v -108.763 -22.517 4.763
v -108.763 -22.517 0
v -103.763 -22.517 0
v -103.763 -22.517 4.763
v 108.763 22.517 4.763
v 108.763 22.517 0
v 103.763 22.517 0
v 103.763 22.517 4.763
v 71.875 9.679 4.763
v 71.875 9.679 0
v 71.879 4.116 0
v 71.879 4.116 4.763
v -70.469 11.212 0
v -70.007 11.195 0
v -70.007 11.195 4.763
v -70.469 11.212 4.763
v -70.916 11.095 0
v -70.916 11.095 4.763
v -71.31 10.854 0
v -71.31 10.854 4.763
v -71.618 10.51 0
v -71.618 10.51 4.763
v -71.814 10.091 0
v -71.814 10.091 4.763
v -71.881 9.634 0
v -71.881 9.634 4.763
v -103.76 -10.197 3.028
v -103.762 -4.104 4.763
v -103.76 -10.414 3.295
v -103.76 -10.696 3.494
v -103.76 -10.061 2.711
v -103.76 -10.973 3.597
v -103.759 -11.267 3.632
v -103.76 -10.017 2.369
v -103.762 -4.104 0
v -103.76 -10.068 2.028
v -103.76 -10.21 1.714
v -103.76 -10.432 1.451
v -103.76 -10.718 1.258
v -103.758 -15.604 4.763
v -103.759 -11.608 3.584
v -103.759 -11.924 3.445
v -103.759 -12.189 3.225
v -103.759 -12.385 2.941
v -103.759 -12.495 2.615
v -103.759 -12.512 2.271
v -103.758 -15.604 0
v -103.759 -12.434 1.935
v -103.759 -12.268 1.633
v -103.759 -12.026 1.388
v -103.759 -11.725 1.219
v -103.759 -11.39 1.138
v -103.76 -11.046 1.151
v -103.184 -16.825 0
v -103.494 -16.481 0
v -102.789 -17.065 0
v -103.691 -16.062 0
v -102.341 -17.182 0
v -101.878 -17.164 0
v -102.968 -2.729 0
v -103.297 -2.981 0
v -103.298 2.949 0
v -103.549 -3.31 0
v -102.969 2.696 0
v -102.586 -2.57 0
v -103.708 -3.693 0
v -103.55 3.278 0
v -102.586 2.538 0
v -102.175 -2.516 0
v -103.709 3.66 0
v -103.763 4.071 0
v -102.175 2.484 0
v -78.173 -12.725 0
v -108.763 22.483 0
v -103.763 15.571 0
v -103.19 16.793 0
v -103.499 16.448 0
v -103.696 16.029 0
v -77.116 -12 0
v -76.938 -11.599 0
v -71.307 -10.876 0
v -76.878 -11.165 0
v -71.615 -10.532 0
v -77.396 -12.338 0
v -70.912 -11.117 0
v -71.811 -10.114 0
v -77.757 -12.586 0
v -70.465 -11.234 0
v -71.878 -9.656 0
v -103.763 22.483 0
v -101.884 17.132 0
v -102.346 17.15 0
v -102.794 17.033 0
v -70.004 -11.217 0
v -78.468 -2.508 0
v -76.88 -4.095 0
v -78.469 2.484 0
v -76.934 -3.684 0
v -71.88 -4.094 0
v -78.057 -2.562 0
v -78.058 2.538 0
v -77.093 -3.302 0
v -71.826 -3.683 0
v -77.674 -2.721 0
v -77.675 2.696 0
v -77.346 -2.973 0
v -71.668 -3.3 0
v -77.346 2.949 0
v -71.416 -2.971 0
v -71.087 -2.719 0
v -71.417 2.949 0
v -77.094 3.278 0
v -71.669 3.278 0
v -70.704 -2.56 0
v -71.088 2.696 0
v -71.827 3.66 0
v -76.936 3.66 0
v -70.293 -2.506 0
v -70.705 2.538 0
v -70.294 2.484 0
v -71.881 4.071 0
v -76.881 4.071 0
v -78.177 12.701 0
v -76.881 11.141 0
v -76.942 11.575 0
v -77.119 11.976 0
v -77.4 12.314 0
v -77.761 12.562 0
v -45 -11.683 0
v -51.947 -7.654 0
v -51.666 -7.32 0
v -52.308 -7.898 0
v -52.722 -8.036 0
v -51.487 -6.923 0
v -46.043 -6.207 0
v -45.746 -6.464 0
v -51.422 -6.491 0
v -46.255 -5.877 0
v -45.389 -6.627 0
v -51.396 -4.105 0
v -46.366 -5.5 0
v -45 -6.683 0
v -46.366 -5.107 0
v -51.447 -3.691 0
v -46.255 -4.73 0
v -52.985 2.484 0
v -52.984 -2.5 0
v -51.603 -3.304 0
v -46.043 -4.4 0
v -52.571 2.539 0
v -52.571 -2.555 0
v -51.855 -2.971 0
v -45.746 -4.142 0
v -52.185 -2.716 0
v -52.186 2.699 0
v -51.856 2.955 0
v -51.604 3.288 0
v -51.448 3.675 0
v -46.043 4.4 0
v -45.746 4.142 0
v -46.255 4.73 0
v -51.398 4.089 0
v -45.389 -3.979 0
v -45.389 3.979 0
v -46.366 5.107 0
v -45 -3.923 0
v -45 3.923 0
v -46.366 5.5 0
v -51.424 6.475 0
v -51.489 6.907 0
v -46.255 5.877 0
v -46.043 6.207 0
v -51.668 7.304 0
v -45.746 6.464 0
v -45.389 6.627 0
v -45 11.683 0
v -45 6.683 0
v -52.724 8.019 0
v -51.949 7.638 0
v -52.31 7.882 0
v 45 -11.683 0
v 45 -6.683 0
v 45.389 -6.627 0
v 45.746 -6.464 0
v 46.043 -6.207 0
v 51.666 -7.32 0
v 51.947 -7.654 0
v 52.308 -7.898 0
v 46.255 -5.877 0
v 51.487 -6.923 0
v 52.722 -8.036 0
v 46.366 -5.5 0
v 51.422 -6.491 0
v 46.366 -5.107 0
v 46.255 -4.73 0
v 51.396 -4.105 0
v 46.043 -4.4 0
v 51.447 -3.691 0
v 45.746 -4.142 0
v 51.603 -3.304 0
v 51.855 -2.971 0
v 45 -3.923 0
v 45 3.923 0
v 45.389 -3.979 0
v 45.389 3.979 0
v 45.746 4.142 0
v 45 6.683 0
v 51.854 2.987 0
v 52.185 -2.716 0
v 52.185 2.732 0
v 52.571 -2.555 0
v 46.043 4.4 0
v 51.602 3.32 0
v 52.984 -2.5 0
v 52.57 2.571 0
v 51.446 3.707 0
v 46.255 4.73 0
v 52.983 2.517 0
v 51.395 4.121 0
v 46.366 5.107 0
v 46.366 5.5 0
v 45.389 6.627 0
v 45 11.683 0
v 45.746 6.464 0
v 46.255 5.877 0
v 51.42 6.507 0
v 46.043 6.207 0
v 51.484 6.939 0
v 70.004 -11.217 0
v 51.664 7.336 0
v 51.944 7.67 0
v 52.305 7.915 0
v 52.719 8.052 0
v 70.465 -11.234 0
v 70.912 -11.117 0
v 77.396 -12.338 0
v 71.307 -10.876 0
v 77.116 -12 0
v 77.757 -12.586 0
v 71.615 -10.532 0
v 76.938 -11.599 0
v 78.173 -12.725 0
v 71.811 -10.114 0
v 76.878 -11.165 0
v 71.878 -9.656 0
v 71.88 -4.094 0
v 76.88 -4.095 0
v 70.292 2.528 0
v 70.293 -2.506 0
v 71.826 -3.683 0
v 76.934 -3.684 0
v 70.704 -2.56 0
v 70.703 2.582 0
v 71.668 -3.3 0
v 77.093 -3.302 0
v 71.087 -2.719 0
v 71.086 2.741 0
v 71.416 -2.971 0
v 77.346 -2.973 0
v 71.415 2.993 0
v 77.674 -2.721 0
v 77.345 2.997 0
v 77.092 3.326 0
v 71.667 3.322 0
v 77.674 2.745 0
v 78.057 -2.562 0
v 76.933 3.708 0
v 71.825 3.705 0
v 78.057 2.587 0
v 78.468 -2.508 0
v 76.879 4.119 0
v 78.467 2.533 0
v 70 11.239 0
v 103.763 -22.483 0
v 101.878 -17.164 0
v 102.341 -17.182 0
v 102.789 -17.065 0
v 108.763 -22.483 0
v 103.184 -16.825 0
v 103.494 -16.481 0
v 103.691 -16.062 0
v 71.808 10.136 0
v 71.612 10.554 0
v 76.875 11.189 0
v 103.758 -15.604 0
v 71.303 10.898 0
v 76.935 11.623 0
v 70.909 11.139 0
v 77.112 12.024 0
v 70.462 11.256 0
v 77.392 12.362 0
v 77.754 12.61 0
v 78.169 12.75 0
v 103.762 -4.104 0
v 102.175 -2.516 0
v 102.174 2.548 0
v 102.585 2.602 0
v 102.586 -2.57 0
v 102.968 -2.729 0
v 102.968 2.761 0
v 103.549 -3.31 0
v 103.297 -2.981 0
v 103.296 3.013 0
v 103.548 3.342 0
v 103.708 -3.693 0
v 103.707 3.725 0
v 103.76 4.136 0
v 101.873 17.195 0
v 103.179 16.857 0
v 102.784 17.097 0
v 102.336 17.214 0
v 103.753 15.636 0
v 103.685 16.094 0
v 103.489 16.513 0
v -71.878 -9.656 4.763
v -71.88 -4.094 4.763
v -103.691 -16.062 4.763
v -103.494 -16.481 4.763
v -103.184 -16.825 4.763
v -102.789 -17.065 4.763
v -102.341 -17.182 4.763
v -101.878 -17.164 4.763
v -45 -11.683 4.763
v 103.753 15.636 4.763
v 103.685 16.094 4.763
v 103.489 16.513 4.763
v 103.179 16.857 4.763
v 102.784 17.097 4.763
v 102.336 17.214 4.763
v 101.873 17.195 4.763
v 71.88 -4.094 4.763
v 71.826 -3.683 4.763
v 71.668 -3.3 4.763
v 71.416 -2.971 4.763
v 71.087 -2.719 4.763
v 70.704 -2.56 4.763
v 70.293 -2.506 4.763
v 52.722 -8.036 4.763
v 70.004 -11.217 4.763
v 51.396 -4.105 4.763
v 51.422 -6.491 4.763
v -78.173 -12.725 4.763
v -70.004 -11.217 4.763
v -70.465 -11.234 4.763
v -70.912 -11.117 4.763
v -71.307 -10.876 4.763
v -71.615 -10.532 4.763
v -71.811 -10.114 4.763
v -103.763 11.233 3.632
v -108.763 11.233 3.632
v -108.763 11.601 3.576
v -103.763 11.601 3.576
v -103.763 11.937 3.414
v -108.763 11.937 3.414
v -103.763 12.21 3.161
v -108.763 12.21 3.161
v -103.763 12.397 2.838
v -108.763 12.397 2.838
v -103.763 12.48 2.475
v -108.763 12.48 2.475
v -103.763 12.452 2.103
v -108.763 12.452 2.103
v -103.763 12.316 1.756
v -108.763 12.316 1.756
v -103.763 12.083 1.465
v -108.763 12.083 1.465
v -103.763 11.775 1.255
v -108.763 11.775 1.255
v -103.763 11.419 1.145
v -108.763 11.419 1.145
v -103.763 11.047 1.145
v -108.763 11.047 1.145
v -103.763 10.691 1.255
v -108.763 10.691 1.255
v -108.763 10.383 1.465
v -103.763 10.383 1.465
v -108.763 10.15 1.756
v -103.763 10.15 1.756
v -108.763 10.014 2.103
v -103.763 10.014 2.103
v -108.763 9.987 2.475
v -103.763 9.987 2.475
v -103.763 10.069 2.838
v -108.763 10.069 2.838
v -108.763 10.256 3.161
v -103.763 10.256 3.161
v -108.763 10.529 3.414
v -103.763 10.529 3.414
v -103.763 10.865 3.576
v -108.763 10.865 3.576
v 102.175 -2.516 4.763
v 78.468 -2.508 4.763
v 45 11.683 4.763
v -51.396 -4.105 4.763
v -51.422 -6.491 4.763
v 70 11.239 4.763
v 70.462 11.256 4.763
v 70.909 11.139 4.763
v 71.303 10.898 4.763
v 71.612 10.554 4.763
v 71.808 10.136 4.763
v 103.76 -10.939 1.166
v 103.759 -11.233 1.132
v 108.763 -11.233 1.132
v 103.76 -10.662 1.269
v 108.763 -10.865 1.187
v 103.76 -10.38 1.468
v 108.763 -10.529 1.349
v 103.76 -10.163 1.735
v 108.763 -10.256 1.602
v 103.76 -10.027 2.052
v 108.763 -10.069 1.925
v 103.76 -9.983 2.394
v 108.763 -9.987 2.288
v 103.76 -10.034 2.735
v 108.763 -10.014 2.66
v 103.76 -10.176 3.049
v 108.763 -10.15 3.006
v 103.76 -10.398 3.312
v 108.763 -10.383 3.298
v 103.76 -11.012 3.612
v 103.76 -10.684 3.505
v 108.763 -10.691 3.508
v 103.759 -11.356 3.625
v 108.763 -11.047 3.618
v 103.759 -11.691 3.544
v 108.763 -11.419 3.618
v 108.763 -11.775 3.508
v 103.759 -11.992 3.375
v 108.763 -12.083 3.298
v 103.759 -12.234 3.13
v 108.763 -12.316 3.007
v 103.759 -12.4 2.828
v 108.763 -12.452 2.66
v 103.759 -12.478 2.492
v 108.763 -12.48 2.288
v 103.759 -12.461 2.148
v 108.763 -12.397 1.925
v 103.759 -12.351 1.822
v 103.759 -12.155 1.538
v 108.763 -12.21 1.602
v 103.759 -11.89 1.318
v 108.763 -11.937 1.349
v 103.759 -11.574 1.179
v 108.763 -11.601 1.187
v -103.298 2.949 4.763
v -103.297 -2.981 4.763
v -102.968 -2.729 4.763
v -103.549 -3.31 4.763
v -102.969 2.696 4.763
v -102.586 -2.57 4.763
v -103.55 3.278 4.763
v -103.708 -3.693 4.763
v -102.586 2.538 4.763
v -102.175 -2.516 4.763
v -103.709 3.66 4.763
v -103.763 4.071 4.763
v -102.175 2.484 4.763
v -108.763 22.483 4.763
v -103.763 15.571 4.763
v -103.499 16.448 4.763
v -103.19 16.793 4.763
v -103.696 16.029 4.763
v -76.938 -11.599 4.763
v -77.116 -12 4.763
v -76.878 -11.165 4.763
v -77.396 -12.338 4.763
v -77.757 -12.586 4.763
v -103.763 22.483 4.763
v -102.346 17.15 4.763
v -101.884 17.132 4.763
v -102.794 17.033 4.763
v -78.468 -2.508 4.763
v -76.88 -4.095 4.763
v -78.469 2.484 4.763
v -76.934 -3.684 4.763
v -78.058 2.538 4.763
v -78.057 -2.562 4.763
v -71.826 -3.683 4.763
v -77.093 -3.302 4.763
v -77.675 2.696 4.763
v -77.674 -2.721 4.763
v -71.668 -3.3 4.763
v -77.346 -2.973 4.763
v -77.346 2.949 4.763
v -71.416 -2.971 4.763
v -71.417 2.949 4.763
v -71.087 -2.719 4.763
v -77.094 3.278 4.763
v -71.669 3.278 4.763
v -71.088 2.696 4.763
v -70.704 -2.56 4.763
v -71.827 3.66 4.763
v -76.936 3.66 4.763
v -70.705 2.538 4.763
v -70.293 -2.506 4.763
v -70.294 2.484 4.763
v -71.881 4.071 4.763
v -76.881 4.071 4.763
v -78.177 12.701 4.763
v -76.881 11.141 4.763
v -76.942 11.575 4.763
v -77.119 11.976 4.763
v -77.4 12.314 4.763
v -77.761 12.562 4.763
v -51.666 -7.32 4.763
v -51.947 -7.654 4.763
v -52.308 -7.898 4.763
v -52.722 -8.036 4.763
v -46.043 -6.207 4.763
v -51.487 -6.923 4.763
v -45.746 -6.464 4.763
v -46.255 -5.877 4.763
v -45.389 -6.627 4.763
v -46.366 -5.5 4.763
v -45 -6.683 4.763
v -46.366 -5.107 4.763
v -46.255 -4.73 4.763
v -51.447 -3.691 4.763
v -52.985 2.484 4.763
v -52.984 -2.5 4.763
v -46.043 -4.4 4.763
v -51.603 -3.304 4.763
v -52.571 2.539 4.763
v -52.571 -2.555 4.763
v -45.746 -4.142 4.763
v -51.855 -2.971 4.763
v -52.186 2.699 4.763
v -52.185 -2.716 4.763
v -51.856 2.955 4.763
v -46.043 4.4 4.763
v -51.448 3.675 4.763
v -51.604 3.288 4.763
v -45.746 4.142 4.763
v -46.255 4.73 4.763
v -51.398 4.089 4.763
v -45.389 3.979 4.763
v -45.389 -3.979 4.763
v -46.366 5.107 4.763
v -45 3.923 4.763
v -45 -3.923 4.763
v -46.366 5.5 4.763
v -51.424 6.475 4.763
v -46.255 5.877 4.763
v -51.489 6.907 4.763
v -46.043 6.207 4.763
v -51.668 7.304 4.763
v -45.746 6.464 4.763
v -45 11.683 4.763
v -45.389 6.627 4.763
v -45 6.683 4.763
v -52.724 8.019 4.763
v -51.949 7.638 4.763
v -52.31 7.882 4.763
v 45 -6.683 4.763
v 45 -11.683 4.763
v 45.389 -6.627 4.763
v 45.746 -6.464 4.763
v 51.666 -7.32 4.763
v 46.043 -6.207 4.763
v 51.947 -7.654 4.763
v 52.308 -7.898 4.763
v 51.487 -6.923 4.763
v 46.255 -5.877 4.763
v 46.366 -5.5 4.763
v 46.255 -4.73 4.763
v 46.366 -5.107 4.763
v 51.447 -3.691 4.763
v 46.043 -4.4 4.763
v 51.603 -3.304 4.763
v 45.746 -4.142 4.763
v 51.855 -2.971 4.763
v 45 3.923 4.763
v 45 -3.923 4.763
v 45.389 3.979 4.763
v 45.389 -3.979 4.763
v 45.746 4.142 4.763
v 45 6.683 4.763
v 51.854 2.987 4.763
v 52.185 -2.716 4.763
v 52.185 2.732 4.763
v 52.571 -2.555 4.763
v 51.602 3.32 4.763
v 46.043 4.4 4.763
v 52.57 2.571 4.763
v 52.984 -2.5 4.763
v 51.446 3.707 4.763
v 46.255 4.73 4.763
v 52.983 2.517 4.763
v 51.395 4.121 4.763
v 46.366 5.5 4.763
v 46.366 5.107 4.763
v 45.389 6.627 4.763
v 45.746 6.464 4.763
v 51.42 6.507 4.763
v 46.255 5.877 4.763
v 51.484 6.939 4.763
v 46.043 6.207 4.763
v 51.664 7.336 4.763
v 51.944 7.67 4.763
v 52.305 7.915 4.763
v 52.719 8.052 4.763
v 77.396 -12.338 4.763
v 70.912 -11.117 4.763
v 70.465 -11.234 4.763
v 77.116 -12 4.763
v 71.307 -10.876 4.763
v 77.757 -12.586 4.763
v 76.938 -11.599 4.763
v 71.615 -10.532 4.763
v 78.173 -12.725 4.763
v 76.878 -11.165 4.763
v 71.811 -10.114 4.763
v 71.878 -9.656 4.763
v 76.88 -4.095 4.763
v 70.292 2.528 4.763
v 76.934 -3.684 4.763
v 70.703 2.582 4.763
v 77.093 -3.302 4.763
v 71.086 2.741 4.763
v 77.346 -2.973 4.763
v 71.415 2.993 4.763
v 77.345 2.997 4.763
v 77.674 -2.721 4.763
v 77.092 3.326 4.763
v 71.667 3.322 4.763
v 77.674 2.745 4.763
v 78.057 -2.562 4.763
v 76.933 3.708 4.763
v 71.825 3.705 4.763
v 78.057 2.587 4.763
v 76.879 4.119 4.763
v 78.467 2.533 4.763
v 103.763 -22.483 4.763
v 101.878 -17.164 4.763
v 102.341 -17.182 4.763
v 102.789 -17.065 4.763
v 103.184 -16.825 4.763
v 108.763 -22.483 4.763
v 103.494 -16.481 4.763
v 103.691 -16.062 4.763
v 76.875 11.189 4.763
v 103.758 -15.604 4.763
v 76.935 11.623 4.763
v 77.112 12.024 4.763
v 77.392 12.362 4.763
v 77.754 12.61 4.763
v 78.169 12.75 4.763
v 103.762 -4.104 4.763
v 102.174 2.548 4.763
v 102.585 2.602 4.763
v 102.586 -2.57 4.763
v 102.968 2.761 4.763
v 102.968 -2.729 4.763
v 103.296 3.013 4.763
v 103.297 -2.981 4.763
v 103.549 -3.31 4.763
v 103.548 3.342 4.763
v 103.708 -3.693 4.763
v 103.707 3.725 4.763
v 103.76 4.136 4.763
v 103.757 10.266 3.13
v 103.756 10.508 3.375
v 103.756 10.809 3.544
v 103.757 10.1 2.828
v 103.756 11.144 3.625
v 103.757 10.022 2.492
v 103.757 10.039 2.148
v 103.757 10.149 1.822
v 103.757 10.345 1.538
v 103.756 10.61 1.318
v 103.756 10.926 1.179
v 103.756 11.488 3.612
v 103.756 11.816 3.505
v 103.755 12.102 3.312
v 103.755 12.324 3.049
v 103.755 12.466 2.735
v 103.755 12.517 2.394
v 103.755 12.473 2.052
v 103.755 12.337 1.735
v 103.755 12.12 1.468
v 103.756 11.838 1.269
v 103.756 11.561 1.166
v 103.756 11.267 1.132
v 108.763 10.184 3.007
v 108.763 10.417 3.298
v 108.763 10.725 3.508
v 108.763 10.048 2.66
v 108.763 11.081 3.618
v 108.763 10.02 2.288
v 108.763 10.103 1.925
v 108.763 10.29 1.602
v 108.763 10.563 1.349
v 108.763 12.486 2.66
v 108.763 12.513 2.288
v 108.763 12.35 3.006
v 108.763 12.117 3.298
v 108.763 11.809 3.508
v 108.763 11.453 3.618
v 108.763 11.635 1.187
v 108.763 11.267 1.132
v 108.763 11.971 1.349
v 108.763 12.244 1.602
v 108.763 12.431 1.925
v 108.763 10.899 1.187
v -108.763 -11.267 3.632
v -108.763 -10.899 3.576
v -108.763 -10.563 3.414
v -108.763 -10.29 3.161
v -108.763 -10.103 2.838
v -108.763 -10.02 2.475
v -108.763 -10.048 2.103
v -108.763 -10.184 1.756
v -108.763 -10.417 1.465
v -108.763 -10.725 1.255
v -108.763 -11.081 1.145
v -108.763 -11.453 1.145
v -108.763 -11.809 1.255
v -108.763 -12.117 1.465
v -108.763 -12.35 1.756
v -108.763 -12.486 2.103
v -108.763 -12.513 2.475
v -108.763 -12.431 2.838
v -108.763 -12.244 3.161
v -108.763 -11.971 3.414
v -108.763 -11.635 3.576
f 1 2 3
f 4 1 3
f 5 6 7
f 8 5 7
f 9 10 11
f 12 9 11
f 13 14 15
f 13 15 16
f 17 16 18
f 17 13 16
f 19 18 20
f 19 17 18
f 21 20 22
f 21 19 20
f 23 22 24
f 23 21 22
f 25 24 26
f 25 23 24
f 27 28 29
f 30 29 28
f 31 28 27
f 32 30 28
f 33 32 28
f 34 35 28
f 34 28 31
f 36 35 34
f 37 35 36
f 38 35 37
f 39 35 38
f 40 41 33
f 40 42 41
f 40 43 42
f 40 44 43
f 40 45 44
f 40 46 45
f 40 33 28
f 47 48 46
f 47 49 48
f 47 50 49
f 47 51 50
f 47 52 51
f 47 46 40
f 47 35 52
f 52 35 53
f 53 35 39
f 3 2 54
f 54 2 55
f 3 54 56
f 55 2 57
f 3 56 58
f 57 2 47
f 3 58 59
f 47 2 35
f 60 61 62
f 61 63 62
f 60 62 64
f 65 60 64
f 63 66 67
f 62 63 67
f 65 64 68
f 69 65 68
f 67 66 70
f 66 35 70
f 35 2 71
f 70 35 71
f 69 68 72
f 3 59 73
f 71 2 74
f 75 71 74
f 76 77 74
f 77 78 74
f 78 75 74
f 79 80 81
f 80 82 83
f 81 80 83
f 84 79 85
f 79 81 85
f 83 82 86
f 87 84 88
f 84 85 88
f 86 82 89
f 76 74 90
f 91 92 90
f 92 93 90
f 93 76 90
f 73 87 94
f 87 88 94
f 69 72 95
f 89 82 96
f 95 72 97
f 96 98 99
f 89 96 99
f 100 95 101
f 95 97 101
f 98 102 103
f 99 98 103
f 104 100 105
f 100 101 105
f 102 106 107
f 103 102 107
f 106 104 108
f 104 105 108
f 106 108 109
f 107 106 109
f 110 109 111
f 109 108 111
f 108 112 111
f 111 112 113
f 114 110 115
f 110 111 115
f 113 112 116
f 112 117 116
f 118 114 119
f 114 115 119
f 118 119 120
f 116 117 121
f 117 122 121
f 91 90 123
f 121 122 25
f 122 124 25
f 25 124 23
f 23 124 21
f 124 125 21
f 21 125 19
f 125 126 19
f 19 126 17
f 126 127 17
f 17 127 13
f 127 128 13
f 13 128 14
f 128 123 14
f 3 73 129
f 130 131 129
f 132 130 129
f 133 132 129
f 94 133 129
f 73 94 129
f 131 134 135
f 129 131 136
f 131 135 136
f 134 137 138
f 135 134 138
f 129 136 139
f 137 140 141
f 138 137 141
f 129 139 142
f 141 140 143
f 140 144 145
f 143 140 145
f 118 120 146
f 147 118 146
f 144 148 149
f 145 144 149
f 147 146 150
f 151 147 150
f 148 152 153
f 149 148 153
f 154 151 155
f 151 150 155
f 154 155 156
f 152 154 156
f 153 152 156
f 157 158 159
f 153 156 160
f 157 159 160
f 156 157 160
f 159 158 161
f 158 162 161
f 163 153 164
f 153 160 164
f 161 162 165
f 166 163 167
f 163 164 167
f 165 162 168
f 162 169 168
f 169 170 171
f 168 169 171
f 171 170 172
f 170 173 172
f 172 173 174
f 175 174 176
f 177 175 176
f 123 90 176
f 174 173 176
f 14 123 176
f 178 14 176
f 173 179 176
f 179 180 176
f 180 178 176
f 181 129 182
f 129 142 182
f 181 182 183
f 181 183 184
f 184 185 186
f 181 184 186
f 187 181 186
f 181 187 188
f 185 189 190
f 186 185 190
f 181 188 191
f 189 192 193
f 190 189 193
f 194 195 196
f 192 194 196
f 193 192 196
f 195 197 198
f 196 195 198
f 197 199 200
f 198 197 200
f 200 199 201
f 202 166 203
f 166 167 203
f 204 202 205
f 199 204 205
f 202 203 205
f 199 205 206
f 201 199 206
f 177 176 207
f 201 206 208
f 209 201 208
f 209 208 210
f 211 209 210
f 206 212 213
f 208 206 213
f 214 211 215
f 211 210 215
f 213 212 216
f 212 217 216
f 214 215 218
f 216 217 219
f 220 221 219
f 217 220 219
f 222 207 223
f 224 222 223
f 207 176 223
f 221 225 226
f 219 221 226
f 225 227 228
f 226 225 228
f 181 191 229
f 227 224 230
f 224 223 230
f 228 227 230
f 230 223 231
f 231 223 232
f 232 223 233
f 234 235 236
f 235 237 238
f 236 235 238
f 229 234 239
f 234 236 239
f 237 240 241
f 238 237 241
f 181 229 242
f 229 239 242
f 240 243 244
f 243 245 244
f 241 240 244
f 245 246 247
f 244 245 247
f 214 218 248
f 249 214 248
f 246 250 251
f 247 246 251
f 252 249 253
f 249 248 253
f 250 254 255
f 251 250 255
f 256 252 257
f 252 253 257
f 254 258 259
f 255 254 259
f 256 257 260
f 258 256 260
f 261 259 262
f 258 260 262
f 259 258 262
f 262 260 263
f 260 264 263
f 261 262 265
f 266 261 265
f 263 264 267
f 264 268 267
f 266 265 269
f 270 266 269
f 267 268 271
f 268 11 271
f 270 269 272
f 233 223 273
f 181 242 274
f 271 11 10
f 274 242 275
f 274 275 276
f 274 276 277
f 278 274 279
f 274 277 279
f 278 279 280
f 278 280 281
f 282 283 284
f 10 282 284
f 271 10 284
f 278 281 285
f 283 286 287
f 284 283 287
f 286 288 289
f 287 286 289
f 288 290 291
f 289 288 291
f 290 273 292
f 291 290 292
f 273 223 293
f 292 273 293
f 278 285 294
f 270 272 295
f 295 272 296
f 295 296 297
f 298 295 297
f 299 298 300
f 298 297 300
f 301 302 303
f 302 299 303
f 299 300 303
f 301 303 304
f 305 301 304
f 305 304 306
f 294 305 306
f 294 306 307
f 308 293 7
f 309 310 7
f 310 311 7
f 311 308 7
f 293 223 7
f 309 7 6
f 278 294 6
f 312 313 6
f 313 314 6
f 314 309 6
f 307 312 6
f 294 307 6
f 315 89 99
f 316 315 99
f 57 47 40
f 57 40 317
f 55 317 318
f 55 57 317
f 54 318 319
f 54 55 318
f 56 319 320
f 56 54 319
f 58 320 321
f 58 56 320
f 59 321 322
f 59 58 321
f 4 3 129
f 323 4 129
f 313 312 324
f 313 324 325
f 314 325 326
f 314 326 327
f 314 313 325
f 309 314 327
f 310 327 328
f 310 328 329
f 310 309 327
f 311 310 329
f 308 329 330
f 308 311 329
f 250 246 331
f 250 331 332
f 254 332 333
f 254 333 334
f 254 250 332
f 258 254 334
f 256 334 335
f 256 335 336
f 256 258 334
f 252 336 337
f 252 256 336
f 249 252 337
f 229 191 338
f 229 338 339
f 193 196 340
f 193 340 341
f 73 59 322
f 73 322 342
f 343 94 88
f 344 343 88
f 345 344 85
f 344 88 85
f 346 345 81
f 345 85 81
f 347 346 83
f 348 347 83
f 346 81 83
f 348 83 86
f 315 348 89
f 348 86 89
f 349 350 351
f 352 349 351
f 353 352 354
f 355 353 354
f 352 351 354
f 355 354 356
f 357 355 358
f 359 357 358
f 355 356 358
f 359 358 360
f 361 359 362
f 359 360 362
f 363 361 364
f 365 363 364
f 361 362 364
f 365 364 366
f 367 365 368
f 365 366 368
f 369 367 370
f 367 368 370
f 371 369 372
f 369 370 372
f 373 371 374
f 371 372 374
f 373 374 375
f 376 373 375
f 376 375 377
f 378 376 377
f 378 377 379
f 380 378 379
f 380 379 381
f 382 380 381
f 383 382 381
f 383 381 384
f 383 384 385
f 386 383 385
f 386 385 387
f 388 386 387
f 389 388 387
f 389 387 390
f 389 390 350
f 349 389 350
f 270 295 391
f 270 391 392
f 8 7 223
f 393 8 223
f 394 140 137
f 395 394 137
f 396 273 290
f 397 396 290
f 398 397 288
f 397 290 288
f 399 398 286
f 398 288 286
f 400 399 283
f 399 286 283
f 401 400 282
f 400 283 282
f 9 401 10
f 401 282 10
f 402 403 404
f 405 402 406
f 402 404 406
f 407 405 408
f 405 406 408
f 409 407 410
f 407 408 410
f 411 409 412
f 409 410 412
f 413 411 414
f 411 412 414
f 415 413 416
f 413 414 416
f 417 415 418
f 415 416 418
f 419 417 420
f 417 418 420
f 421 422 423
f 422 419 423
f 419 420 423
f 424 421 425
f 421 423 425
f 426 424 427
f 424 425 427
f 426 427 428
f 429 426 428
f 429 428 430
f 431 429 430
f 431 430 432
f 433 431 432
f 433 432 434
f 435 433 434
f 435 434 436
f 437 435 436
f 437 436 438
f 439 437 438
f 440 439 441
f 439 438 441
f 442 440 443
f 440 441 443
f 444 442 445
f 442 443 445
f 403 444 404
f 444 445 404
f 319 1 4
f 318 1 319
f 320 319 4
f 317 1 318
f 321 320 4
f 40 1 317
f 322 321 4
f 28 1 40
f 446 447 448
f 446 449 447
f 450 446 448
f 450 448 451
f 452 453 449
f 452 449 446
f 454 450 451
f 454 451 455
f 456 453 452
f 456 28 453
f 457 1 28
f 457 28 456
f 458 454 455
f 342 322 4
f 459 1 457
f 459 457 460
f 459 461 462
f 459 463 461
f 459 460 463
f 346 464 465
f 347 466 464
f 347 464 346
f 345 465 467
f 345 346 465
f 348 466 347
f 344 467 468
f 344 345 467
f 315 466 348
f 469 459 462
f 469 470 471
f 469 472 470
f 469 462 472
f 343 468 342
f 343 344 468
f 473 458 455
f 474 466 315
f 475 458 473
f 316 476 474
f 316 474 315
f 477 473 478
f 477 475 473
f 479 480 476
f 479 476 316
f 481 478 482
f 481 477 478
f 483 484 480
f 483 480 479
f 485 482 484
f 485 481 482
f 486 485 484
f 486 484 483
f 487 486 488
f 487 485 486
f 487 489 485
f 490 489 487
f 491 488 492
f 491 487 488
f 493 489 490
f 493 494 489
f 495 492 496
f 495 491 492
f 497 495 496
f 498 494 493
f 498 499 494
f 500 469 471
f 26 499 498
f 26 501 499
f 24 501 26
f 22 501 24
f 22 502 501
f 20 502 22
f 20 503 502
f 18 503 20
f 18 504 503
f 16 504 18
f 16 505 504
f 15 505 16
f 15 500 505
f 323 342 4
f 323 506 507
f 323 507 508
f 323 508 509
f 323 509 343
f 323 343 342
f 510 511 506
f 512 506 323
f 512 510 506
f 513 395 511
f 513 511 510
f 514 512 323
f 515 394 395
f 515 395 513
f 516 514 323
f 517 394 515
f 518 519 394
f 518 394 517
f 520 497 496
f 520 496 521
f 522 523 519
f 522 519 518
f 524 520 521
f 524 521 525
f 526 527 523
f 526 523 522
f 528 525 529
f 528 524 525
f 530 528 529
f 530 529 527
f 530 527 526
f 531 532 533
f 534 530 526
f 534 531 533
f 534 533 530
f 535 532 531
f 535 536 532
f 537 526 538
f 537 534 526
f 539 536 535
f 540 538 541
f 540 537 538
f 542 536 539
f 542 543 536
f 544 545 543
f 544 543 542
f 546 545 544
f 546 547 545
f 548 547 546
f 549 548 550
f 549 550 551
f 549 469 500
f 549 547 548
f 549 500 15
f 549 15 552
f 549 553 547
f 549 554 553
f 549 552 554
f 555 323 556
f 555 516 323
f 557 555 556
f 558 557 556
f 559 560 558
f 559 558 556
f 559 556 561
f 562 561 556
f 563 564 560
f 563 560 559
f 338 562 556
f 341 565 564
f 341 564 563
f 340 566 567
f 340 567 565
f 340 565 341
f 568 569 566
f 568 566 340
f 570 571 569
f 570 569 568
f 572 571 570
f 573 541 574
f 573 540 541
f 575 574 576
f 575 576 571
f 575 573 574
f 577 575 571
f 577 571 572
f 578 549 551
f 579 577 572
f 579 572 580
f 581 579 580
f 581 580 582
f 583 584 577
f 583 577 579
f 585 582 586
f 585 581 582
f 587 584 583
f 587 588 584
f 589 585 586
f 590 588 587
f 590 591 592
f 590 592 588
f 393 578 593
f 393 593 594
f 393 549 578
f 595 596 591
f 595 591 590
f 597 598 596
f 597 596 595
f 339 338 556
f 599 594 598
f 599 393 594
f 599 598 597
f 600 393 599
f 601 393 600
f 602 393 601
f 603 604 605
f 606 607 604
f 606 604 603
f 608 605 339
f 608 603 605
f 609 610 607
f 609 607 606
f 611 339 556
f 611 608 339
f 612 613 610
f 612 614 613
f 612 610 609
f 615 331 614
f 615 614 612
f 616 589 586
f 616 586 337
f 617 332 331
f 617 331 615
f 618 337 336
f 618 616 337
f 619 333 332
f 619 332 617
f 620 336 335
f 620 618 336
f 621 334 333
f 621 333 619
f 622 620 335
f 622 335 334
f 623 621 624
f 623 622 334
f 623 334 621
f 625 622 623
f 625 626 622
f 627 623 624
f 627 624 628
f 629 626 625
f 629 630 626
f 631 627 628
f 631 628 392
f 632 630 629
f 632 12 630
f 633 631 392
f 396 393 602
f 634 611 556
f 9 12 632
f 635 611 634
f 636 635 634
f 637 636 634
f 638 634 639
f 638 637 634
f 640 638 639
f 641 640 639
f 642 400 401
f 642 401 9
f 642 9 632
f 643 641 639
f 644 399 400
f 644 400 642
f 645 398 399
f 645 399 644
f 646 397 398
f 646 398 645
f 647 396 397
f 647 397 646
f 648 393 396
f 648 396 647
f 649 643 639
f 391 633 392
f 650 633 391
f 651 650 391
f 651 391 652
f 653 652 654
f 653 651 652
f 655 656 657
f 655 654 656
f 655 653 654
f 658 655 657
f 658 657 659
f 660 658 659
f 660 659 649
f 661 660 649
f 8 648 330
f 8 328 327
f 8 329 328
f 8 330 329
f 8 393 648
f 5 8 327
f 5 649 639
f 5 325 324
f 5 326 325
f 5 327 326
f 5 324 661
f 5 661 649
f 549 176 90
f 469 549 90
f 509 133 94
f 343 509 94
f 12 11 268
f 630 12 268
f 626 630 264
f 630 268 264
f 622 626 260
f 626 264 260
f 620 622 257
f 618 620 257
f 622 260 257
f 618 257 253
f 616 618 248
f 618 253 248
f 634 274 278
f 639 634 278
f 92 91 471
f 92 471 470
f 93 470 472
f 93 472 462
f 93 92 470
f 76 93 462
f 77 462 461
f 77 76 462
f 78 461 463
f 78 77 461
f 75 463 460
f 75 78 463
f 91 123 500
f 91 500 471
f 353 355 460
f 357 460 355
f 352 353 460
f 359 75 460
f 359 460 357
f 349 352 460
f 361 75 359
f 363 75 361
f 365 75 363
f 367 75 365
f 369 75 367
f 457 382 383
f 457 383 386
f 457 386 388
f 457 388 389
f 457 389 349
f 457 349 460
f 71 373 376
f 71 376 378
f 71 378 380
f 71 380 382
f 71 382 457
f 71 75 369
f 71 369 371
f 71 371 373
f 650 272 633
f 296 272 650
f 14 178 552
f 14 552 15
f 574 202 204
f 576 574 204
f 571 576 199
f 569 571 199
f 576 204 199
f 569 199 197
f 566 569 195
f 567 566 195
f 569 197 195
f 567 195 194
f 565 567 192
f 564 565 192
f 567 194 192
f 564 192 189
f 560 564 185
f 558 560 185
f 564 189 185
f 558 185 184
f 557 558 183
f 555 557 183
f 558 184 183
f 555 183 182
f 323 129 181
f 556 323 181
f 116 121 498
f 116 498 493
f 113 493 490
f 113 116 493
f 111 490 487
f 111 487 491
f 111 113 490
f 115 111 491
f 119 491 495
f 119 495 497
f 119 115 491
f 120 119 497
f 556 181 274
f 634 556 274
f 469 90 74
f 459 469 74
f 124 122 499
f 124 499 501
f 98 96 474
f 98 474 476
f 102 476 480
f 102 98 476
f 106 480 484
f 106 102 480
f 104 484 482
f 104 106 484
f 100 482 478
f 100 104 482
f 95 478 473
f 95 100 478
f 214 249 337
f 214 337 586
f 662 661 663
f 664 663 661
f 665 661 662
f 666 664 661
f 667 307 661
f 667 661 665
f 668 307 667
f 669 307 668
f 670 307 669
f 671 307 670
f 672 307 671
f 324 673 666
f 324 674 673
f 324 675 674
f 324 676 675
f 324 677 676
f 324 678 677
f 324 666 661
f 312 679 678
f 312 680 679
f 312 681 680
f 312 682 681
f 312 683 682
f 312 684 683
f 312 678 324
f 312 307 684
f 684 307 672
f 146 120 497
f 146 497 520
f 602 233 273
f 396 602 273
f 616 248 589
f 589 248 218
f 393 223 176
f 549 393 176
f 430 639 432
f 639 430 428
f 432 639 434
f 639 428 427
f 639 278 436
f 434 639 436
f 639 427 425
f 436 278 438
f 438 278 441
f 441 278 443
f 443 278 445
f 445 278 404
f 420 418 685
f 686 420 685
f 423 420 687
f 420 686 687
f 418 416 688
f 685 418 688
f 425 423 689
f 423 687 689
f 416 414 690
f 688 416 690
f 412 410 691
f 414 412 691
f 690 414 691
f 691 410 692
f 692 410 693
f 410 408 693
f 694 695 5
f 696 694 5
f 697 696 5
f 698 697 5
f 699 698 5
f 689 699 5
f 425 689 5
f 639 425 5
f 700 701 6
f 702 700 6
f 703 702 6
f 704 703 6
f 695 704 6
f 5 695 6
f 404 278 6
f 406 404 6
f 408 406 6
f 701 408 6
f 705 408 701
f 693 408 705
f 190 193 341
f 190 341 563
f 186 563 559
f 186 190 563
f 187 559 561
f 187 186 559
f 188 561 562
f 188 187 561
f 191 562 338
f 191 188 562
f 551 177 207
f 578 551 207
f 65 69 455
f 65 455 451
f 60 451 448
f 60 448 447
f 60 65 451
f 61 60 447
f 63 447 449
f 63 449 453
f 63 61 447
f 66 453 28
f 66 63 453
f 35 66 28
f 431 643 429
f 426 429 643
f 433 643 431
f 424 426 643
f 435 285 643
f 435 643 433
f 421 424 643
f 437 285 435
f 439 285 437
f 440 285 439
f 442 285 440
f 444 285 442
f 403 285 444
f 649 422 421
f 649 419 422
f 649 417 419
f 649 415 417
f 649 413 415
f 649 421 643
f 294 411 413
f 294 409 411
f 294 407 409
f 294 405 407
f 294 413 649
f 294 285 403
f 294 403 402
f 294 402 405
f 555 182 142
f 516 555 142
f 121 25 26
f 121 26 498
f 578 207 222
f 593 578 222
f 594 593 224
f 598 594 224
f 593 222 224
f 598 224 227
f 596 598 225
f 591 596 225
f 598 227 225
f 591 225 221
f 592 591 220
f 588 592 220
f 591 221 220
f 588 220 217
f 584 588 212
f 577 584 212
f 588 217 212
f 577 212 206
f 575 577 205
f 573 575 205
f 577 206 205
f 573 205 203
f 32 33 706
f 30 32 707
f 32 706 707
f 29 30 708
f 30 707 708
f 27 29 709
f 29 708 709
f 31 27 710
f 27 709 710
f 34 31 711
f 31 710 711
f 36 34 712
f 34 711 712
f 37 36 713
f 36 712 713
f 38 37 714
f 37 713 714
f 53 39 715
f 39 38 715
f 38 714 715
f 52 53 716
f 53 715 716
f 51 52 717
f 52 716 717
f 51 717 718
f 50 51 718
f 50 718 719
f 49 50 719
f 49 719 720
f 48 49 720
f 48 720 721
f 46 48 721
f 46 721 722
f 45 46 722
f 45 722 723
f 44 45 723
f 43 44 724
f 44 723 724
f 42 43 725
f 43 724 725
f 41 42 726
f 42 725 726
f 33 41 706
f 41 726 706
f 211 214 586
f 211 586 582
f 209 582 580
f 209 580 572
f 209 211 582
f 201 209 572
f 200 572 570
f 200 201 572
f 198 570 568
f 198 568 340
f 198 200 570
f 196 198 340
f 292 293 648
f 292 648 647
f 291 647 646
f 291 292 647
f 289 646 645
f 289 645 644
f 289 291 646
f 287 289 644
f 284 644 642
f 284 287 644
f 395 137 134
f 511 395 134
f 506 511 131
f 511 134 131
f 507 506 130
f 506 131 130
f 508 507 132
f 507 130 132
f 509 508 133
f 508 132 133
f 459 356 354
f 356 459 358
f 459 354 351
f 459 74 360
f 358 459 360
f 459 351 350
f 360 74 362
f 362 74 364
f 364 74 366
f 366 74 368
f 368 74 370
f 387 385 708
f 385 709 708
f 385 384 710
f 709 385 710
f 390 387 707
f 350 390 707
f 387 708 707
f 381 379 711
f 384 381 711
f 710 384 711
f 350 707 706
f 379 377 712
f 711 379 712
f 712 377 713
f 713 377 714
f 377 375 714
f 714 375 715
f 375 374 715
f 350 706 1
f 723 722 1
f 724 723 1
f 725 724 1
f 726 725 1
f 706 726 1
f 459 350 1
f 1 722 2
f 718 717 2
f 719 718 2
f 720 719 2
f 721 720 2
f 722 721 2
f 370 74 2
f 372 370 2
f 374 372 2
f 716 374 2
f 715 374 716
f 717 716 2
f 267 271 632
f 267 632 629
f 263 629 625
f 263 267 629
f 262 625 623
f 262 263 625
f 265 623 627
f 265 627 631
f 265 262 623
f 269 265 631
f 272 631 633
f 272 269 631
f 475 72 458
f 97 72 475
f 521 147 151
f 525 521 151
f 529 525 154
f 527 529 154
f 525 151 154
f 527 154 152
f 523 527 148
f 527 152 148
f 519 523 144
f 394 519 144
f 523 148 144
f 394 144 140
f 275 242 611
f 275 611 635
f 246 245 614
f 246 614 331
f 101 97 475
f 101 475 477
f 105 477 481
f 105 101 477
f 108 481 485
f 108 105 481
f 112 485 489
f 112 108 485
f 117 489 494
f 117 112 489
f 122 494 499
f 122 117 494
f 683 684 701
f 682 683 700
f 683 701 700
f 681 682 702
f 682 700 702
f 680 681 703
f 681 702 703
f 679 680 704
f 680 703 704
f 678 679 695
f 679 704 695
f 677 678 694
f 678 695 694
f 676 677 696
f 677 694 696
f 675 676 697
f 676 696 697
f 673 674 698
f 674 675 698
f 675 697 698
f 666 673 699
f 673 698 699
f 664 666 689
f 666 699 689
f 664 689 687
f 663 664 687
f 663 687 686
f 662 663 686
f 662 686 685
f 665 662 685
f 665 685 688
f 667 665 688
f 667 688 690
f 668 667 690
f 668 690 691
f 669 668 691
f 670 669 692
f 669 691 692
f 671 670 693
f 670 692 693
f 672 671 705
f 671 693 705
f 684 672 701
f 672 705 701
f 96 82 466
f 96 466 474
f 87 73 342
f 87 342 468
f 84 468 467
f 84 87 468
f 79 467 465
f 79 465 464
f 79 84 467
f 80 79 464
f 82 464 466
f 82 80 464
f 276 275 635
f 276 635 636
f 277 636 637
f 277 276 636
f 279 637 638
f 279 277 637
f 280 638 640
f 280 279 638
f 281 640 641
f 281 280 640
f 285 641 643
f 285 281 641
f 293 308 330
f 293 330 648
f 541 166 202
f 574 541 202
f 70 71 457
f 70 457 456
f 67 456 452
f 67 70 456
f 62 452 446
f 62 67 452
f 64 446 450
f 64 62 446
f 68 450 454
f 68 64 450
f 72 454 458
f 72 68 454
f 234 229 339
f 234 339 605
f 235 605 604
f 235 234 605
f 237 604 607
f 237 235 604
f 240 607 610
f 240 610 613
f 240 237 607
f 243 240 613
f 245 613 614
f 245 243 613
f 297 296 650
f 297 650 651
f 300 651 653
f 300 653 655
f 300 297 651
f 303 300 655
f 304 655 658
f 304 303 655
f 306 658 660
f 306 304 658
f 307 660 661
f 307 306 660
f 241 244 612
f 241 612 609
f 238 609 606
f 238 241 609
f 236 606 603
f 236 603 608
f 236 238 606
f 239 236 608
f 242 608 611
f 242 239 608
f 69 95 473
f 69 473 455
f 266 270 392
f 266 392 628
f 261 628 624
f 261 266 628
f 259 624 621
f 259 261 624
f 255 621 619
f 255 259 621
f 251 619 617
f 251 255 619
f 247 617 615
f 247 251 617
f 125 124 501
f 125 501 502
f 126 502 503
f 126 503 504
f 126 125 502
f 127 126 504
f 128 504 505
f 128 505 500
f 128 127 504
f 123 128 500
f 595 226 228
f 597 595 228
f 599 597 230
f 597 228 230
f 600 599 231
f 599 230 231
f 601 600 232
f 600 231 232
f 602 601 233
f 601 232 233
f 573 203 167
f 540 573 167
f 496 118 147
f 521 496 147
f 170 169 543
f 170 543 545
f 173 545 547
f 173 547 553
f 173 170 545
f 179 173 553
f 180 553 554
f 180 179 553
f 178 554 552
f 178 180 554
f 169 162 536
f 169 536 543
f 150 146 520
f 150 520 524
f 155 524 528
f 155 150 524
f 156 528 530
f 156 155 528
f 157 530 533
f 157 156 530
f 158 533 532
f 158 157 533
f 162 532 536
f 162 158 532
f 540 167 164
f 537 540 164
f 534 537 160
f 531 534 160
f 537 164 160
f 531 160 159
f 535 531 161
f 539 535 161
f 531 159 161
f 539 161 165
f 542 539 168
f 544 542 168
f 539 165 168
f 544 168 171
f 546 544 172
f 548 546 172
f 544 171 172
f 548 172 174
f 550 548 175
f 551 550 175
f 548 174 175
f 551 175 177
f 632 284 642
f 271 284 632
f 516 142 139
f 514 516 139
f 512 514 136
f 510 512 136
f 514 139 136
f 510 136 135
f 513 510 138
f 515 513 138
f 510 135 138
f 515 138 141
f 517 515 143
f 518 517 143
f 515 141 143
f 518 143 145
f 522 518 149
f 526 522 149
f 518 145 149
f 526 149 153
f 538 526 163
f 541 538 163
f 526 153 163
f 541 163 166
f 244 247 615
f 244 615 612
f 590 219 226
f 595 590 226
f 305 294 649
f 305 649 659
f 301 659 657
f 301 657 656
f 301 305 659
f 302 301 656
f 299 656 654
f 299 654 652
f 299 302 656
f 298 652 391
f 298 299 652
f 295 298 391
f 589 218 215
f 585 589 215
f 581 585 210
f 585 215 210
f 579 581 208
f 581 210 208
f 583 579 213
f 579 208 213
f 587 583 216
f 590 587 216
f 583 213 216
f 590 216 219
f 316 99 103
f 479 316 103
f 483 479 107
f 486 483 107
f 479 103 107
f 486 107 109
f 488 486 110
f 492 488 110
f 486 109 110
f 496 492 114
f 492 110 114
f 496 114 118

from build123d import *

# Parameters (mm, degrees)
BOSS_EXTRUDE1_DEPTH              = 4.763
TAP_DRILL_FOR_M3X0_5_TAP1_REACH  = 220.74
TAP_DRILL_FOR_M3X0_5_TAP1_BORE_R = 1.25
TAP_DRILL_FOR_M3X0_5_TAP2_REACH  = 220.74
TAP_DRILL_FOR_M3X0_5_TAP2_BORE_R = 1.25


with BuildPart() as part:
    # Sketch3 → Boss-Extrude1 (new body)
    with BuildSketch(Plane.XY):
        Polygon((-108.762998674, 22.483018567), (-108.762998674, -22.516981433), (-103.762998674, -22.516981433), (-45, -11.683163514), (45, -11.683163514), (103.762998674, -22.483018567), (108.762998674, -22.483018567), (108.762998674, 22.516981433), (103.762998674, 22.516981433), (45, 11.683163514), (-45, 11.683163514), (-103.762998674, 22.483018567), align=None)
        with BuildLine():
            Line((-45, -3.923438204), (45, -3.923438204))
            ThreePointArc((45, -3.923438204), (46.379862655, -5.303300859), (45, -6.683163514))
            Line((45, -6.683163514), (-45, -6.683163514))
            ThreePointArc((-45, -6.683163514), (-46.379862655, -5.303300859), (-45, -3.923438204))
        make_face(mode=Mode.SUBTRACT)
        with BuildLine():
            Line((-45, 6.683163514), (45, 6.683163514))
            ThreePointArc((45, 6.683163514), (46.379862655, 5.303300859), (45, 3.923438204))
            Line((45, 3.923438204), (-45, 3.923438204))
            ThreePointArc((-45, 3.923438204), (-46.379862655, 5.303300859), (-45, 6.683163514))
        make_face(mode=Mode.SUBTRACT)
        with BuildLine():
            Line((-103.762998674, 15.571322269), (-103.762998674, 4.07129926))
            ThreePointArc((-103.762998674, 4.07129926), (-103.298030689, 2.948767244), (-102.175498674, 2.48379926))
            Line((-102.175498674, 2.48379926), (-78.468999337, 2.48379926))
            ThreePointArc((-78.468999337, 2.48379926), (-77.346467322, 2.948767244), (-76.881499337, 4.07129926))
            Line((-76.881499337, 4.07129926), (-76.881499337, 11.140532377))
            ThreePointArc((-76.881499337, 11.140532377), (-77.247696598, 12.154719672), (-78.177342953, 12.701010766))
            Line((-78.177342953, 12.701010766), (-101.88384229, 17.131800658))
            ThreePointArc((-101.88384229, 17.131800658), (-103.18968597, 16.792625008), (-103.762998674, 15.571322269))
        make_face(mode=Mode.SUBTRACT)
        with BuildLine():
            Line((-52.721922194, -8.035531504), (-70.003544755, -11.217242177))
            ThreePointArc((-70.003544755, -11.217242177), (-71.306631893, -10.87607345), (-71.878487463, -9.656477863))
            Line((-71.878487463, -9.656477863), (-71.880224509, -4.093745129))
            ThreePointArc((-71.880224509, -4.093745129), (-71.415607074, -2.971067976), (-70.293220307, -2.505749486))
            Line((-70.293220307, -2.505749486), (-52.984228369, -2.500344496))
            ThreePointArc((-52.984228369, -2.500344496), (-51.855362923, -2.971180632), (-51.396324213, -4.104894584))
            Line((-51.396324213, -4.104894584), (-51.421956543, -6.491321636))
            ThreePointArc((-51.421956543, -6.491321636), (-51.794905097, -7.496642951), (-52.721922194, -8.035531504))
        make_face(mode=Mode.SUBTRACT)
        with BuildLine():
            Line((-71.881499337, 9.634032264), (-71.881499337, 4.07129926))
            ThreePointArc((-71.881499337, 4.07129926), (-71.416531352, 2.948767244), (-70.293999337, 2.48379926))
            Line((-70.293999337, 2.48379926), (-52.985006556, 2.48379926))
            ThreePointArc((-52.985006556, 2.48379926), (-51.85628819, 2.954987878), (-51.397603521, 4.088845117))
            Line((-51.397603521, 4.088845117), (-51.423981048, 6.475264048))
            ThreePointArc((-51.423981048, 6.475264048), (-51.79724351, 7.480468855), (-52.724428838, 8.019067907))
            Line((-52.724428838, 8.019067907), (-70.007044093, 11.195381981))
            ThreePointArc((-70.007044093, 11.195381981), (-71.310024632, 10.853806362), (-71.881499337, 9.634032264))
        make_face(mode=Mode.SUBTRACT)
        with BuildLine():
            Line((-78.468219908, -2.508302252), (-102.17471809, -2.515704959))
            ThreePointArc((-102.17471809, -2.515704959), (-103.297104857, -2.981023449), (-103.761722292, -4.103700602))
            Line((-103.761722292, -4.103700602), (-103.758131238, -15.603723051))
            ThreePointArc((-103.758131238, -15.603723051), (-103.184437192, -16.824846705), (-101.878487663, -17.16361457))
            Line((-101.878487663, -17.16361457), (-78.173373062, -12.725422186))
            ThreePointArc((-78.173373062, -12.725422186), (-77.24389734, -12.178840823), (-76.878016792, -11.164539226))
            Line((-76.878016792, -11.164539226), (-76.880224265, -4.095306454))
            ThreePointArc((-76.880224265, -4.095306454), (-77.345542755, -2.972919687), (-78.468219908, -2.508302252))
        make_face(mode=Mode.SUBTRACT)
        with BuildLine():
            Line((103.758131238, -15.603723051), (103.761722292, -4.103700602))
            ThreePointArc((103.761722292, -4.103700602), (103.297104857, -2.981023449), (102.17471809, -2.515704959))
            Line((102.17471809, -2.515704959), (78.468219908, -2.508302252))
            ThreePointArc((78.468219908, -2.508302252), (77.345542755, -2.972919687), (76.880224265, -4.095306454))
            Line((76.880224265, -4.095306454), (76.878016792, -11.164539226))
            ThreePointArc((76.878016792, -11.164539226), (77.24389734, -12.178840823), (78.173373062, -12.725422186))
            Line((78.173373062, -12.725422186), (101.878487663, -17.16361457))
            ThreePointArc((101.878487663, -17.16361457), (103.184437192, -16.824846705), (103.758131238, -15.603723051))
        make_face(mode=Mode.SUBTRACT)
        with BuildLine():
            Line((71.878487463, -9.656477863), (71.880224509, -4.093745129))
            ThreePointArc((71.880224509, -4.093745129), (71.415607074, -2.971067976), (70.293220307, -2.505749486))
            Line((70.293220307, -2.505749486), (52.984228369, -2.500344496))
            ThreePointArc((52.984228369, -2.500344496), (51.855362923, -2.971180632), (51.396324213, -4.104894584))
            Line((51.396324213, -4.104894584), (51.421956543, -6.491321636))
            ThreePointArc((51.421956543, -6.491321636), (51.794905097, -7.496642951), (52.721922194, -8.035531504))
            Line((52.721922194, -8.035531504), (70.003544755, -11.217242177))
            ThreePointArc((70.003544755, -11.217242177), (71.306631893, -10.87607345), (71.878487463, -9.656477863))
        make_face(mode=Mode.SUBTRACT)
        with BuildLine():
            Line((52.719410409, 8.051994317), (70.000038591, 11.239101279))
            ThreePointArc((70.000038591, 11.239101279), (71.3032322, 10.898339477), (71.875468579, 9.67892252))
            Line((71.875468579, 9.67892252), (71.878942671, 4.1161906))
            ThreePointArc((71.878942671, 4.1161906), (71.414675832, 2.993368417), (70.292434422, 2.527699469))
            Line((70.292434422, 2.527699469), (52.983445016, 2.516889488))
            ThreePointArc((52.983445016, 2.516889488), (51.854432599, 2.987373096), (51.395039893, 4.120943651))
            Line((51.395039893, 4.120943651), (51.419927024, 6.507378591))
            ThreePointArc((51.419927024, 6.507378591), (51.792561634, 7.512816316), (52.719410409, 8.051994317))
        make_face(mode=Mode.SUBTRACT)
        with BuildLine():
            Line((78.467432828, 2.532804999), (102.173927542, 2.547610413))
            ThreePointArc((102.173927542, 2.547610413), (103.296168952, 3.013279362), (103.760435791, 4.136101544))
            Line((103.760435791, 4.136101544), (103.753253685, 15.636122311))
            ThreePointArc((103.753253685, 15.636122311), (103.179178352, 16.857066761), (101.873123102, 17.195426807))
            Line((101.873123102, 17.195426807), (78.169395548, 12.749832365))
            ThreePointArc((78.169395548, 12.749832365), (77.24009055, 12.202960786), (76.87452675, 11.188544987))
            Line((76.87452675, 11.188544987), (76.878941696, 4.119313249))
            ThreePointArc((76.878941696, 4.119313249), (77.344610645, 2.997071839), (78.467432828, 2.532804999))
        make_face(mode=Mode.SUBTRACT)
    extrude(amount=BOSS_EXTRUDE1_DEPTH)

    # Tap Drill for M3x0.5 Tap1 bore → Tap Drill for M3x0.5 Tap1 (cut, up to next)
    with BuildSketch(Plane(origin=(108.762998674, 0, 0), x_dir=(0, 0, -1), z_dir=(1, 0, 0)), mode=Mode.PRIVATE) as tap_drill_for_m3x0_5_tap1_sk1:
        with Locations((-2.3815, 11.266981433)):
            Circle(TAP_DRILL_FOR_M3X0_5_TAP1_BORE_R)
    tap_drill_for_m3x0_5_tap1_tool1 = extrude(tap_drill_for_m3x0_5_tap1_sk1.sketch, amount=-TAP_DRILL_FOR_M3X0_5_TAP1_REACH, mode=Mode.PRIVATE) & part.part
    # Tap Drill for M3x0.5 Tap1 bore → Tap Drill for M3x0.5 Tap1 (cut, up to next)
    with BuildSketch(Plane(origin=(108.762998674, 0, 0), x_dir=(0, 0, -1), z_dir=(1, 0, 0)), mode=Mode.PRIVATE) as tap_drill_for_m3x0_5_tap1_sk2:
        with Locations((-2.3815, -11.233018567)):
            Circle(TAP_DRILL_FOR_M3X0_5_TAP1_BORE_R)
    tap_drill_for_m3x0_5_tap1_tool2 = extrude(tap_drill_for_m3x0_5_tap1_sk2.sketch, amount=-TAP_DRILL_FOR_M3X0_5_TAP1_REACH, mode=Mode.PRIVATE) & part.part
    add(tap_drill_for_m3x0_5_tap1_tool1.solids().sort_by_distance((108.762999, 11.266981, 2.3815))[0], mode=Mode.SUBTRACT)
    add(tap_drill_for_m3x0_5_tap1_tool2.solids().sort_by_distance((108.762999, -11.233019, 2.3815))[0], mode=Mode.SUBTRACT)

    # Tap Drill for M3x0.5 Tap2 bore → Tap Drill for M3x0.5 Tap2 (cut, up to next)
    with BuildSketch(Plane.ZY.offset(108.762998674), mode=Mode.PRIVATE) as tap_drill_for_m3x0_5_tap2_sk1:
        with Locations((2.3815, 11.233018567)):
            Circle(TAP_DRILL_FOR_M3X0_5_TAP2_BORE_R)
    tap_drill_for_m3x0_5_tap2_tool1 = extrude(tap_drill_for_m3x0_5_tap2_sk1.sketch, amount=-TAP_DRILL_FOR_M3X0_5_TAP2_REACH, mode=Mode.PRIVATE) & part.part
    # Tap Drill for M3x0.5 Tap2 bore → Tap Drill for M3x0.5 Tap2 (cut, up to next)
    with BuildSketch(Plane.ZY.offset(108.762998674), mode=Mode.PRIVATE) as tap_drill_for_m3x0_5_tap2_sk2:
        with Locations((2.3815, -11.266981433)):
            Circle(TAP_DRILL_FOR_M3X0_5_TAP2_BORE_R)
    tap_drill_for_m3x0_5_tap2_tool2 = extrude(tap_drill_for_m3x0_5_tap2_sk2.sketch, amount=-TAP_DRILL_FOR_M3X0_5_TAP2_REACH, mode=Mode.PRIVATE) & part.part
    add(tap_drill_for_m3x0_5_tap2_tool1.solids().sort_by_distance((-108.762999, 11.233019, 2.3815))[0], mode=Mode.SUBTRACT)
    add(tap_drill_for_m3x0_5_tap2_tool2.solids().sort_by_distance((-108.762999, -11.266981, 2.3815))[0], mode=Mode.SUBTRACT)


solid = part.part
